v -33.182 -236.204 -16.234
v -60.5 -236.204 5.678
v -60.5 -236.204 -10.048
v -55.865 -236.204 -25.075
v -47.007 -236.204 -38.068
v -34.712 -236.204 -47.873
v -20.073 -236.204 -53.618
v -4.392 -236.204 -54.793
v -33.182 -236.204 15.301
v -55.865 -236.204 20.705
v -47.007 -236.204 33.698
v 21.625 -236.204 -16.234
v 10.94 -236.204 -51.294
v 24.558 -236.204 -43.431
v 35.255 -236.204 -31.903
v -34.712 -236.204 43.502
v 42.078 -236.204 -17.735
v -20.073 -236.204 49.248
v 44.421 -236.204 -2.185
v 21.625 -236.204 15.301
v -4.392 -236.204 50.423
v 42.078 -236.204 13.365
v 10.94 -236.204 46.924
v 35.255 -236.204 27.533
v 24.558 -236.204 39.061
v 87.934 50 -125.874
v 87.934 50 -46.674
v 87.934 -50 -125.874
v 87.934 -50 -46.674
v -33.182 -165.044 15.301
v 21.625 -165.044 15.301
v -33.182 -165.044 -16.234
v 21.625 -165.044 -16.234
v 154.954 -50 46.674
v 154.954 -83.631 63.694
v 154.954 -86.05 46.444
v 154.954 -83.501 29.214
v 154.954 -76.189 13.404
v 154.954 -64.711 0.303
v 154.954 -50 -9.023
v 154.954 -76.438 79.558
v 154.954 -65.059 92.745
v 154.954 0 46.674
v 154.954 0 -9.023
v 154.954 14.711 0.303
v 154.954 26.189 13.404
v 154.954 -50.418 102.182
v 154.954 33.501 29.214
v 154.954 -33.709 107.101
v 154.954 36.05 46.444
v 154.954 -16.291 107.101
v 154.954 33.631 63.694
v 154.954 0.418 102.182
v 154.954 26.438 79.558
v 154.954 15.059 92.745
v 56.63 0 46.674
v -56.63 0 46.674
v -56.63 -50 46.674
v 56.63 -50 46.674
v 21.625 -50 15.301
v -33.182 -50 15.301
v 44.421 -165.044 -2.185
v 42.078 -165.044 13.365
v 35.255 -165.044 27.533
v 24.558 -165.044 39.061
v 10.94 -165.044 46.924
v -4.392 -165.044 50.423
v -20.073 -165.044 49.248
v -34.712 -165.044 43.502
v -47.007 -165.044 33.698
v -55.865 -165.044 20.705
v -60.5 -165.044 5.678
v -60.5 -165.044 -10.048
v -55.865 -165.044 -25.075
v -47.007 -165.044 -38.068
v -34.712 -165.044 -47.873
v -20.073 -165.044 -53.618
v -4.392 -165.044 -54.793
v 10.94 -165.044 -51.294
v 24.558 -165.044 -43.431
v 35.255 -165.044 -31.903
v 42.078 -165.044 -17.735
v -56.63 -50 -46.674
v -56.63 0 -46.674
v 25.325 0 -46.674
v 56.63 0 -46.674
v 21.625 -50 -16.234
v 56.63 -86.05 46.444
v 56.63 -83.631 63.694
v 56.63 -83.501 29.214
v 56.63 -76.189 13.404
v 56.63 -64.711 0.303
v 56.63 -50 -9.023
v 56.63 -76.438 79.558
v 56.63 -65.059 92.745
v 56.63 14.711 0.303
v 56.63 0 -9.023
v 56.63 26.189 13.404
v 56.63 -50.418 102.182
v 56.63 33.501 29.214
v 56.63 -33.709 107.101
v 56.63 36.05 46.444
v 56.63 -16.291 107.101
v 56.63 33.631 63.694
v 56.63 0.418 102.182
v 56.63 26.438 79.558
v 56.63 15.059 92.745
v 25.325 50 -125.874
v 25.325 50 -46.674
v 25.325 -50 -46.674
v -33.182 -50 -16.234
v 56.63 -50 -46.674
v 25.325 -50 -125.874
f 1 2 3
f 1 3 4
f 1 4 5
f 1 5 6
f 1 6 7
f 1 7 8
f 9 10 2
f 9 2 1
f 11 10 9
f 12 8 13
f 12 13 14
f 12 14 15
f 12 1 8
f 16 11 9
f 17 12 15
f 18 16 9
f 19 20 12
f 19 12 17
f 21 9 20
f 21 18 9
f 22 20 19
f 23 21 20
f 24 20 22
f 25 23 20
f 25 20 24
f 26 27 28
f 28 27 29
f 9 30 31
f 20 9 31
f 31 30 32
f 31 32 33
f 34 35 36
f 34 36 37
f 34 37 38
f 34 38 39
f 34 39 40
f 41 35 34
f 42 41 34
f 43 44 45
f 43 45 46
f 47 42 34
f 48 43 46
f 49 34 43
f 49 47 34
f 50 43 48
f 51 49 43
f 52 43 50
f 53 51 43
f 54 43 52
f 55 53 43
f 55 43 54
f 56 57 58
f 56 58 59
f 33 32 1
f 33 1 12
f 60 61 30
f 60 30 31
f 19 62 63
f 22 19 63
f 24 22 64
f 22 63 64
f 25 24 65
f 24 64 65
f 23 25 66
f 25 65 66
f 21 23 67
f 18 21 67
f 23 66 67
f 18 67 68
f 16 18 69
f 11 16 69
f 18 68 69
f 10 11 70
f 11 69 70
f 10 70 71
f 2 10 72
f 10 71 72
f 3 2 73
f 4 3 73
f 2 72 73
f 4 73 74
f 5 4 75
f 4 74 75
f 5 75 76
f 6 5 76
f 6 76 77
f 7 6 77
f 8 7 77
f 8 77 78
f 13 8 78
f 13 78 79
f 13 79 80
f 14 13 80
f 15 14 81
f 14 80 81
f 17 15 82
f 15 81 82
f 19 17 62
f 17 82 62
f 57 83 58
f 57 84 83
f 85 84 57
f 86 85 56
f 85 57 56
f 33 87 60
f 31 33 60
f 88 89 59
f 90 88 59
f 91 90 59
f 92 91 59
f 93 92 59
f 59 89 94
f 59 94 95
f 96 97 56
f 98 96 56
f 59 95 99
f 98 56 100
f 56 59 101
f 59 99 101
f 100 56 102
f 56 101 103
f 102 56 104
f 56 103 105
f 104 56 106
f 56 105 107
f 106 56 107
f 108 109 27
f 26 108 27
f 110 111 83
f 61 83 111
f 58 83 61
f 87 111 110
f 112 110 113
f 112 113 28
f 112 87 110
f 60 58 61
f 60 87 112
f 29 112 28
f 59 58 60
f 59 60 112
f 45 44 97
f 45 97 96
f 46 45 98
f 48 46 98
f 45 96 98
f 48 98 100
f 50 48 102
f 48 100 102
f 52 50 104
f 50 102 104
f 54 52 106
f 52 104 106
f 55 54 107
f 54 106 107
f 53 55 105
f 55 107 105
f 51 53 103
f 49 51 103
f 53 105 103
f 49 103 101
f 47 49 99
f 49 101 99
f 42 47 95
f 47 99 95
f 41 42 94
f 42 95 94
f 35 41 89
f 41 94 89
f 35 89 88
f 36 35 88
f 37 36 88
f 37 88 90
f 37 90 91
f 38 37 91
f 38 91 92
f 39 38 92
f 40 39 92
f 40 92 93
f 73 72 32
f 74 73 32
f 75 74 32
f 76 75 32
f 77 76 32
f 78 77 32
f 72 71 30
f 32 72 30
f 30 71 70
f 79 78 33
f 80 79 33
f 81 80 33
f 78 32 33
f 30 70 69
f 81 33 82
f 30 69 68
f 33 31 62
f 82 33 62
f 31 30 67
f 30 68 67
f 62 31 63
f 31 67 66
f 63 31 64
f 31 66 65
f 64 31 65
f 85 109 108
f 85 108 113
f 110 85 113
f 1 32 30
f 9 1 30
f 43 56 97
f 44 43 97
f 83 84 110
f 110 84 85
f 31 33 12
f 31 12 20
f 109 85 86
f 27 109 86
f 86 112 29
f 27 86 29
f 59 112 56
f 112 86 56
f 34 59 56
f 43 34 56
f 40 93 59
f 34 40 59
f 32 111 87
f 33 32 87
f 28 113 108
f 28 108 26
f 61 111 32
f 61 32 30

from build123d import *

# Parameters (mm, degrees)
F0_W        = 113.259896636
F0_H        = 93.3482274413
F1_DEPTH    = 25
F2_W        = 54.8066571355
F2_H        = 31.5346177667
F3_DEPTH    = 115.0439456105
F1_FACE_W   = 113.259896636
F1_FACE_H   = 93.3482274413
F1_FACE_W_2 = 54.8066571355
F1_FACE_H_2 = 31.5346177667
F4_W        = 54.8066571355
F4_H        = 31.5346177667
F5_DEPTH    = 25
F6_R        = 52.7555643641
F6_W        = 54.8066571355
F6_H        = 31.5346177667
F7_DEPTH    = 71.1605325341
F8_W        = 62.6089163125
F8_H        = 100
F9_DEPTH    = 79.2002081871
F14_DEPTH   = 98.3245372772


# Not quite as in the source:
# - the program builds the solid bodies; features that only make, move or delete a surface that nothing else refers to are left out


with BuildPart() as f1:
    # F0 (on Front) → F1 (new body)
    with BuildSketch(Plane.XZ):
        Rectangle(F0_W, F0_H)
    extrude(amount=F1_DEPTH)

    # F2 (on face) → F3 (join)
    with BuildSketch(Plane.XZ.offset(25)):
        with Locations((-5.7783313096, -0.4667351022)):
            Rectangle(F2_W, F2_H)
    extrude(amount=F3_DEPTH)

    # F1_face (on face) + F4 (on face) → F5 (join)
    with BuildSketch(Plane.XZ.offset(25)):
        Rectangle(F1_FACE_W, F1_FACE_H)
        with Locations((-5.7783313096, -0.4667351022)):
            Rectangle(F1_FACE_W_2, F1_FACE_H_2, mode=Mode.SUBTRACT)
    with BuildSketch(Plane.XZ.offset(140.0439456105)):
        with Locations((-5.7783313096, -0.4667351022)):
            Rectangle(F4_W, F4_H)
    extrude(amount=F5_DEPTH)

    # F8 (on face) → F9 (join)
    with BuildSketch(Plane(origin=(0, 0, -46.6741137207), x_dir=(1, 0, 0), z_dir=(0, 0, -1))):
        with Locations((56.629948318, 0)):
            Rectangle(F8_W, F8_H)
    extrude(amount=F9_DEPTH)


with BuildPart() as f7:
    # F6 (on face) → F7 (new body)
    with BuildSketch(Plane.XZ.offset(165.0439456105)):
        with Locations((-8.3341598511, -2.1851621568)):
            Circle(F6_R)
        with Locations((-5.7783313096, -0.4667351022)):
            Rectangle(F6_W, F6_H, mode=Mode.SUBTRACT)
    extrude(amount=F7_DEPTH)


with BuildPart() as f14:
    # F13 (on face) → F14 (new body)
    with BuildSketch(Plane.YZ.offset(56.629948318)):
        with BuildLine():
            ThreePointArc((0, -9.0233932707), (26.2517549134, 13.5007825139), (36.0508991339, 46.6741137207))
            ThreePointArc((36.0508991339, 46.6741137207), (-58.1733312068, 97.925868634), (-50, -9.0233932707))
            Line((-50, -9.0233932707), (-50, 46.6741137207))
            Line((-50, 46.6741137207), (0, 46.6741137207))
            Line((0, 46.6741137207), (0, -9.0233932707))
        make_face()
    extrude(amount=F14_DEPTH)


solid = Compound([f1.part, f7.part, f14.part])
